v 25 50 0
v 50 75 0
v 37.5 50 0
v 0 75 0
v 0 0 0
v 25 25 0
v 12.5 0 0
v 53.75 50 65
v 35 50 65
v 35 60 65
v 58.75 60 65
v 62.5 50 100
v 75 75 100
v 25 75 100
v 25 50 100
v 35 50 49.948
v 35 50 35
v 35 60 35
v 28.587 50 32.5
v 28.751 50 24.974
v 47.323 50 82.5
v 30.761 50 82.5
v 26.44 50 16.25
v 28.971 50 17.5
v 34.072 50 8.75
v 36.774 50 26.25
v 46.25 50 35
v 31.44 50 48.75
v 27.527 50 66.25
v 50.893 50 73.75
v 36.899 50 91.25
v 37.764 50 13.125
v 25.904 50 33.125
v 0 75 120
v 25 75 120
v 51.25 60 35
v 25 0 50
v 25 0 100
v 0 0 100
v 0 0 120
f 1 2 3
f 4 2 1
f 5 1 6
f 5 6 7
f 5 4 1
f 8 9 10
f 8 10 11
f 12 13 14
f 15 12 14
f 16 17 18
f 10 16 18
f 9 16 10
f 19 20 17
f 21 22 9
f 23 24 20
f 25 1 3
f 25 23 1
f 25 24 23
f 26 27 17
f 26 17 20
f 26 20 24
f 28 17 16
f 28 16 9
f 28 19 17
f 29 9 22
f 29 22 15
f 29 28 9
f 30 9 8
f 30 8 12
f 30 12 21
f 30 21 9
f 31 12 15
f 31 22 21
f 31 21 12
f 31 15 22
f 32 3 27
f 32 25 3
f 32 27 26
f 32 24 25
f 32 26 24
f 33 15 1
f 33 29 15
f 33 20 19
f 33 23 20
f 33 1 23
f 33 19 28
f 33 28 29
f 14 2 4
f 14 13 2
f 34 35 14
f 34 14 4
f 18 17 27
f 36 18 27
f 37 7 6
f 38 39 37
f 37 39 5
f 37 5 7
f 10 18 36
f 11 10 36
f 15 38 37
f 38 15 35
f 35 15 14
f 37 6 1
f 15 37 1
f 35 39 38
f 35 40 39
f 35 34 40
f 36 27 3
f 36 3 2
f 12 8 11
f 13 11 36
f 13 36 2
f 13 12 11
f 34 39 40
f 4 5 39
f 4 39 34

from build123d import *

# Parameters (mm, degrees)
F0_W      = 25
F0_H      = 75
F1_DEPTH  = 120
F6_W      = 25
F6_H      = 20
F12_W     = 35
F12_H     = 30
F13_DEPTH = 60


with BuildPart() as f1:
    # F0 (on Top) → F1 (new body)
    with BuildSketch(Plane.XY):
        with Locations((12.5, 37.5)):
            Rectangle(F0_W, F0_H)
    extrude(amount=F1_DEPTH)

    # F2 (on Top) → F5 section 0
    with BuildSketch(Plane.XY):
        Polygon((50, 75), (25, 75), (25, 50), (37.5, 50), align=None)
    # F4 (on offset) → F5 section 1
    with BuildSketch(Plane.XY.offset(100)):
        Polygon((75, 75), (25, 75), (25, 50), (62.5, 50), align=None)
    loft()

    # F6 (on face) → F8 section 0
    with BuildSketch(Plane.XZ, mode=Mode.PRIVATE) as f8_s0:
        with Locations((12.5, 110)):
            Rectangle(F6_W, F6_H)
    loft([f8_s0.sketch, Vertex(25, 75, 120)], mode=Mode.SUBTRACT)

    # F9 (on face) → F11 section 0
    with BuildSketch(Plane(origin=(0, 0, 0), x_dir=(1, 0, 0), z_dir=(0, 0, -1)), mode=Mode.PRIVATE) as f11_s0:
        Polygon((25, 0), (12.5, 0), (25, -25), align=None)
    loft([f11_s0.sketch, Vertex(25, 0, 50)], mode=Mode.SUBTRACT)

    # F12 (on face) → F13 (cut)
    with BuildSketch(Plane.XZ):
        with Locations((52.5, 50)):
            Rectangle(F12_W, F12_H)
    extrude(amount=-F13_DEPTH, mode=Mode.SUBTRACT)


solid = f1.part
